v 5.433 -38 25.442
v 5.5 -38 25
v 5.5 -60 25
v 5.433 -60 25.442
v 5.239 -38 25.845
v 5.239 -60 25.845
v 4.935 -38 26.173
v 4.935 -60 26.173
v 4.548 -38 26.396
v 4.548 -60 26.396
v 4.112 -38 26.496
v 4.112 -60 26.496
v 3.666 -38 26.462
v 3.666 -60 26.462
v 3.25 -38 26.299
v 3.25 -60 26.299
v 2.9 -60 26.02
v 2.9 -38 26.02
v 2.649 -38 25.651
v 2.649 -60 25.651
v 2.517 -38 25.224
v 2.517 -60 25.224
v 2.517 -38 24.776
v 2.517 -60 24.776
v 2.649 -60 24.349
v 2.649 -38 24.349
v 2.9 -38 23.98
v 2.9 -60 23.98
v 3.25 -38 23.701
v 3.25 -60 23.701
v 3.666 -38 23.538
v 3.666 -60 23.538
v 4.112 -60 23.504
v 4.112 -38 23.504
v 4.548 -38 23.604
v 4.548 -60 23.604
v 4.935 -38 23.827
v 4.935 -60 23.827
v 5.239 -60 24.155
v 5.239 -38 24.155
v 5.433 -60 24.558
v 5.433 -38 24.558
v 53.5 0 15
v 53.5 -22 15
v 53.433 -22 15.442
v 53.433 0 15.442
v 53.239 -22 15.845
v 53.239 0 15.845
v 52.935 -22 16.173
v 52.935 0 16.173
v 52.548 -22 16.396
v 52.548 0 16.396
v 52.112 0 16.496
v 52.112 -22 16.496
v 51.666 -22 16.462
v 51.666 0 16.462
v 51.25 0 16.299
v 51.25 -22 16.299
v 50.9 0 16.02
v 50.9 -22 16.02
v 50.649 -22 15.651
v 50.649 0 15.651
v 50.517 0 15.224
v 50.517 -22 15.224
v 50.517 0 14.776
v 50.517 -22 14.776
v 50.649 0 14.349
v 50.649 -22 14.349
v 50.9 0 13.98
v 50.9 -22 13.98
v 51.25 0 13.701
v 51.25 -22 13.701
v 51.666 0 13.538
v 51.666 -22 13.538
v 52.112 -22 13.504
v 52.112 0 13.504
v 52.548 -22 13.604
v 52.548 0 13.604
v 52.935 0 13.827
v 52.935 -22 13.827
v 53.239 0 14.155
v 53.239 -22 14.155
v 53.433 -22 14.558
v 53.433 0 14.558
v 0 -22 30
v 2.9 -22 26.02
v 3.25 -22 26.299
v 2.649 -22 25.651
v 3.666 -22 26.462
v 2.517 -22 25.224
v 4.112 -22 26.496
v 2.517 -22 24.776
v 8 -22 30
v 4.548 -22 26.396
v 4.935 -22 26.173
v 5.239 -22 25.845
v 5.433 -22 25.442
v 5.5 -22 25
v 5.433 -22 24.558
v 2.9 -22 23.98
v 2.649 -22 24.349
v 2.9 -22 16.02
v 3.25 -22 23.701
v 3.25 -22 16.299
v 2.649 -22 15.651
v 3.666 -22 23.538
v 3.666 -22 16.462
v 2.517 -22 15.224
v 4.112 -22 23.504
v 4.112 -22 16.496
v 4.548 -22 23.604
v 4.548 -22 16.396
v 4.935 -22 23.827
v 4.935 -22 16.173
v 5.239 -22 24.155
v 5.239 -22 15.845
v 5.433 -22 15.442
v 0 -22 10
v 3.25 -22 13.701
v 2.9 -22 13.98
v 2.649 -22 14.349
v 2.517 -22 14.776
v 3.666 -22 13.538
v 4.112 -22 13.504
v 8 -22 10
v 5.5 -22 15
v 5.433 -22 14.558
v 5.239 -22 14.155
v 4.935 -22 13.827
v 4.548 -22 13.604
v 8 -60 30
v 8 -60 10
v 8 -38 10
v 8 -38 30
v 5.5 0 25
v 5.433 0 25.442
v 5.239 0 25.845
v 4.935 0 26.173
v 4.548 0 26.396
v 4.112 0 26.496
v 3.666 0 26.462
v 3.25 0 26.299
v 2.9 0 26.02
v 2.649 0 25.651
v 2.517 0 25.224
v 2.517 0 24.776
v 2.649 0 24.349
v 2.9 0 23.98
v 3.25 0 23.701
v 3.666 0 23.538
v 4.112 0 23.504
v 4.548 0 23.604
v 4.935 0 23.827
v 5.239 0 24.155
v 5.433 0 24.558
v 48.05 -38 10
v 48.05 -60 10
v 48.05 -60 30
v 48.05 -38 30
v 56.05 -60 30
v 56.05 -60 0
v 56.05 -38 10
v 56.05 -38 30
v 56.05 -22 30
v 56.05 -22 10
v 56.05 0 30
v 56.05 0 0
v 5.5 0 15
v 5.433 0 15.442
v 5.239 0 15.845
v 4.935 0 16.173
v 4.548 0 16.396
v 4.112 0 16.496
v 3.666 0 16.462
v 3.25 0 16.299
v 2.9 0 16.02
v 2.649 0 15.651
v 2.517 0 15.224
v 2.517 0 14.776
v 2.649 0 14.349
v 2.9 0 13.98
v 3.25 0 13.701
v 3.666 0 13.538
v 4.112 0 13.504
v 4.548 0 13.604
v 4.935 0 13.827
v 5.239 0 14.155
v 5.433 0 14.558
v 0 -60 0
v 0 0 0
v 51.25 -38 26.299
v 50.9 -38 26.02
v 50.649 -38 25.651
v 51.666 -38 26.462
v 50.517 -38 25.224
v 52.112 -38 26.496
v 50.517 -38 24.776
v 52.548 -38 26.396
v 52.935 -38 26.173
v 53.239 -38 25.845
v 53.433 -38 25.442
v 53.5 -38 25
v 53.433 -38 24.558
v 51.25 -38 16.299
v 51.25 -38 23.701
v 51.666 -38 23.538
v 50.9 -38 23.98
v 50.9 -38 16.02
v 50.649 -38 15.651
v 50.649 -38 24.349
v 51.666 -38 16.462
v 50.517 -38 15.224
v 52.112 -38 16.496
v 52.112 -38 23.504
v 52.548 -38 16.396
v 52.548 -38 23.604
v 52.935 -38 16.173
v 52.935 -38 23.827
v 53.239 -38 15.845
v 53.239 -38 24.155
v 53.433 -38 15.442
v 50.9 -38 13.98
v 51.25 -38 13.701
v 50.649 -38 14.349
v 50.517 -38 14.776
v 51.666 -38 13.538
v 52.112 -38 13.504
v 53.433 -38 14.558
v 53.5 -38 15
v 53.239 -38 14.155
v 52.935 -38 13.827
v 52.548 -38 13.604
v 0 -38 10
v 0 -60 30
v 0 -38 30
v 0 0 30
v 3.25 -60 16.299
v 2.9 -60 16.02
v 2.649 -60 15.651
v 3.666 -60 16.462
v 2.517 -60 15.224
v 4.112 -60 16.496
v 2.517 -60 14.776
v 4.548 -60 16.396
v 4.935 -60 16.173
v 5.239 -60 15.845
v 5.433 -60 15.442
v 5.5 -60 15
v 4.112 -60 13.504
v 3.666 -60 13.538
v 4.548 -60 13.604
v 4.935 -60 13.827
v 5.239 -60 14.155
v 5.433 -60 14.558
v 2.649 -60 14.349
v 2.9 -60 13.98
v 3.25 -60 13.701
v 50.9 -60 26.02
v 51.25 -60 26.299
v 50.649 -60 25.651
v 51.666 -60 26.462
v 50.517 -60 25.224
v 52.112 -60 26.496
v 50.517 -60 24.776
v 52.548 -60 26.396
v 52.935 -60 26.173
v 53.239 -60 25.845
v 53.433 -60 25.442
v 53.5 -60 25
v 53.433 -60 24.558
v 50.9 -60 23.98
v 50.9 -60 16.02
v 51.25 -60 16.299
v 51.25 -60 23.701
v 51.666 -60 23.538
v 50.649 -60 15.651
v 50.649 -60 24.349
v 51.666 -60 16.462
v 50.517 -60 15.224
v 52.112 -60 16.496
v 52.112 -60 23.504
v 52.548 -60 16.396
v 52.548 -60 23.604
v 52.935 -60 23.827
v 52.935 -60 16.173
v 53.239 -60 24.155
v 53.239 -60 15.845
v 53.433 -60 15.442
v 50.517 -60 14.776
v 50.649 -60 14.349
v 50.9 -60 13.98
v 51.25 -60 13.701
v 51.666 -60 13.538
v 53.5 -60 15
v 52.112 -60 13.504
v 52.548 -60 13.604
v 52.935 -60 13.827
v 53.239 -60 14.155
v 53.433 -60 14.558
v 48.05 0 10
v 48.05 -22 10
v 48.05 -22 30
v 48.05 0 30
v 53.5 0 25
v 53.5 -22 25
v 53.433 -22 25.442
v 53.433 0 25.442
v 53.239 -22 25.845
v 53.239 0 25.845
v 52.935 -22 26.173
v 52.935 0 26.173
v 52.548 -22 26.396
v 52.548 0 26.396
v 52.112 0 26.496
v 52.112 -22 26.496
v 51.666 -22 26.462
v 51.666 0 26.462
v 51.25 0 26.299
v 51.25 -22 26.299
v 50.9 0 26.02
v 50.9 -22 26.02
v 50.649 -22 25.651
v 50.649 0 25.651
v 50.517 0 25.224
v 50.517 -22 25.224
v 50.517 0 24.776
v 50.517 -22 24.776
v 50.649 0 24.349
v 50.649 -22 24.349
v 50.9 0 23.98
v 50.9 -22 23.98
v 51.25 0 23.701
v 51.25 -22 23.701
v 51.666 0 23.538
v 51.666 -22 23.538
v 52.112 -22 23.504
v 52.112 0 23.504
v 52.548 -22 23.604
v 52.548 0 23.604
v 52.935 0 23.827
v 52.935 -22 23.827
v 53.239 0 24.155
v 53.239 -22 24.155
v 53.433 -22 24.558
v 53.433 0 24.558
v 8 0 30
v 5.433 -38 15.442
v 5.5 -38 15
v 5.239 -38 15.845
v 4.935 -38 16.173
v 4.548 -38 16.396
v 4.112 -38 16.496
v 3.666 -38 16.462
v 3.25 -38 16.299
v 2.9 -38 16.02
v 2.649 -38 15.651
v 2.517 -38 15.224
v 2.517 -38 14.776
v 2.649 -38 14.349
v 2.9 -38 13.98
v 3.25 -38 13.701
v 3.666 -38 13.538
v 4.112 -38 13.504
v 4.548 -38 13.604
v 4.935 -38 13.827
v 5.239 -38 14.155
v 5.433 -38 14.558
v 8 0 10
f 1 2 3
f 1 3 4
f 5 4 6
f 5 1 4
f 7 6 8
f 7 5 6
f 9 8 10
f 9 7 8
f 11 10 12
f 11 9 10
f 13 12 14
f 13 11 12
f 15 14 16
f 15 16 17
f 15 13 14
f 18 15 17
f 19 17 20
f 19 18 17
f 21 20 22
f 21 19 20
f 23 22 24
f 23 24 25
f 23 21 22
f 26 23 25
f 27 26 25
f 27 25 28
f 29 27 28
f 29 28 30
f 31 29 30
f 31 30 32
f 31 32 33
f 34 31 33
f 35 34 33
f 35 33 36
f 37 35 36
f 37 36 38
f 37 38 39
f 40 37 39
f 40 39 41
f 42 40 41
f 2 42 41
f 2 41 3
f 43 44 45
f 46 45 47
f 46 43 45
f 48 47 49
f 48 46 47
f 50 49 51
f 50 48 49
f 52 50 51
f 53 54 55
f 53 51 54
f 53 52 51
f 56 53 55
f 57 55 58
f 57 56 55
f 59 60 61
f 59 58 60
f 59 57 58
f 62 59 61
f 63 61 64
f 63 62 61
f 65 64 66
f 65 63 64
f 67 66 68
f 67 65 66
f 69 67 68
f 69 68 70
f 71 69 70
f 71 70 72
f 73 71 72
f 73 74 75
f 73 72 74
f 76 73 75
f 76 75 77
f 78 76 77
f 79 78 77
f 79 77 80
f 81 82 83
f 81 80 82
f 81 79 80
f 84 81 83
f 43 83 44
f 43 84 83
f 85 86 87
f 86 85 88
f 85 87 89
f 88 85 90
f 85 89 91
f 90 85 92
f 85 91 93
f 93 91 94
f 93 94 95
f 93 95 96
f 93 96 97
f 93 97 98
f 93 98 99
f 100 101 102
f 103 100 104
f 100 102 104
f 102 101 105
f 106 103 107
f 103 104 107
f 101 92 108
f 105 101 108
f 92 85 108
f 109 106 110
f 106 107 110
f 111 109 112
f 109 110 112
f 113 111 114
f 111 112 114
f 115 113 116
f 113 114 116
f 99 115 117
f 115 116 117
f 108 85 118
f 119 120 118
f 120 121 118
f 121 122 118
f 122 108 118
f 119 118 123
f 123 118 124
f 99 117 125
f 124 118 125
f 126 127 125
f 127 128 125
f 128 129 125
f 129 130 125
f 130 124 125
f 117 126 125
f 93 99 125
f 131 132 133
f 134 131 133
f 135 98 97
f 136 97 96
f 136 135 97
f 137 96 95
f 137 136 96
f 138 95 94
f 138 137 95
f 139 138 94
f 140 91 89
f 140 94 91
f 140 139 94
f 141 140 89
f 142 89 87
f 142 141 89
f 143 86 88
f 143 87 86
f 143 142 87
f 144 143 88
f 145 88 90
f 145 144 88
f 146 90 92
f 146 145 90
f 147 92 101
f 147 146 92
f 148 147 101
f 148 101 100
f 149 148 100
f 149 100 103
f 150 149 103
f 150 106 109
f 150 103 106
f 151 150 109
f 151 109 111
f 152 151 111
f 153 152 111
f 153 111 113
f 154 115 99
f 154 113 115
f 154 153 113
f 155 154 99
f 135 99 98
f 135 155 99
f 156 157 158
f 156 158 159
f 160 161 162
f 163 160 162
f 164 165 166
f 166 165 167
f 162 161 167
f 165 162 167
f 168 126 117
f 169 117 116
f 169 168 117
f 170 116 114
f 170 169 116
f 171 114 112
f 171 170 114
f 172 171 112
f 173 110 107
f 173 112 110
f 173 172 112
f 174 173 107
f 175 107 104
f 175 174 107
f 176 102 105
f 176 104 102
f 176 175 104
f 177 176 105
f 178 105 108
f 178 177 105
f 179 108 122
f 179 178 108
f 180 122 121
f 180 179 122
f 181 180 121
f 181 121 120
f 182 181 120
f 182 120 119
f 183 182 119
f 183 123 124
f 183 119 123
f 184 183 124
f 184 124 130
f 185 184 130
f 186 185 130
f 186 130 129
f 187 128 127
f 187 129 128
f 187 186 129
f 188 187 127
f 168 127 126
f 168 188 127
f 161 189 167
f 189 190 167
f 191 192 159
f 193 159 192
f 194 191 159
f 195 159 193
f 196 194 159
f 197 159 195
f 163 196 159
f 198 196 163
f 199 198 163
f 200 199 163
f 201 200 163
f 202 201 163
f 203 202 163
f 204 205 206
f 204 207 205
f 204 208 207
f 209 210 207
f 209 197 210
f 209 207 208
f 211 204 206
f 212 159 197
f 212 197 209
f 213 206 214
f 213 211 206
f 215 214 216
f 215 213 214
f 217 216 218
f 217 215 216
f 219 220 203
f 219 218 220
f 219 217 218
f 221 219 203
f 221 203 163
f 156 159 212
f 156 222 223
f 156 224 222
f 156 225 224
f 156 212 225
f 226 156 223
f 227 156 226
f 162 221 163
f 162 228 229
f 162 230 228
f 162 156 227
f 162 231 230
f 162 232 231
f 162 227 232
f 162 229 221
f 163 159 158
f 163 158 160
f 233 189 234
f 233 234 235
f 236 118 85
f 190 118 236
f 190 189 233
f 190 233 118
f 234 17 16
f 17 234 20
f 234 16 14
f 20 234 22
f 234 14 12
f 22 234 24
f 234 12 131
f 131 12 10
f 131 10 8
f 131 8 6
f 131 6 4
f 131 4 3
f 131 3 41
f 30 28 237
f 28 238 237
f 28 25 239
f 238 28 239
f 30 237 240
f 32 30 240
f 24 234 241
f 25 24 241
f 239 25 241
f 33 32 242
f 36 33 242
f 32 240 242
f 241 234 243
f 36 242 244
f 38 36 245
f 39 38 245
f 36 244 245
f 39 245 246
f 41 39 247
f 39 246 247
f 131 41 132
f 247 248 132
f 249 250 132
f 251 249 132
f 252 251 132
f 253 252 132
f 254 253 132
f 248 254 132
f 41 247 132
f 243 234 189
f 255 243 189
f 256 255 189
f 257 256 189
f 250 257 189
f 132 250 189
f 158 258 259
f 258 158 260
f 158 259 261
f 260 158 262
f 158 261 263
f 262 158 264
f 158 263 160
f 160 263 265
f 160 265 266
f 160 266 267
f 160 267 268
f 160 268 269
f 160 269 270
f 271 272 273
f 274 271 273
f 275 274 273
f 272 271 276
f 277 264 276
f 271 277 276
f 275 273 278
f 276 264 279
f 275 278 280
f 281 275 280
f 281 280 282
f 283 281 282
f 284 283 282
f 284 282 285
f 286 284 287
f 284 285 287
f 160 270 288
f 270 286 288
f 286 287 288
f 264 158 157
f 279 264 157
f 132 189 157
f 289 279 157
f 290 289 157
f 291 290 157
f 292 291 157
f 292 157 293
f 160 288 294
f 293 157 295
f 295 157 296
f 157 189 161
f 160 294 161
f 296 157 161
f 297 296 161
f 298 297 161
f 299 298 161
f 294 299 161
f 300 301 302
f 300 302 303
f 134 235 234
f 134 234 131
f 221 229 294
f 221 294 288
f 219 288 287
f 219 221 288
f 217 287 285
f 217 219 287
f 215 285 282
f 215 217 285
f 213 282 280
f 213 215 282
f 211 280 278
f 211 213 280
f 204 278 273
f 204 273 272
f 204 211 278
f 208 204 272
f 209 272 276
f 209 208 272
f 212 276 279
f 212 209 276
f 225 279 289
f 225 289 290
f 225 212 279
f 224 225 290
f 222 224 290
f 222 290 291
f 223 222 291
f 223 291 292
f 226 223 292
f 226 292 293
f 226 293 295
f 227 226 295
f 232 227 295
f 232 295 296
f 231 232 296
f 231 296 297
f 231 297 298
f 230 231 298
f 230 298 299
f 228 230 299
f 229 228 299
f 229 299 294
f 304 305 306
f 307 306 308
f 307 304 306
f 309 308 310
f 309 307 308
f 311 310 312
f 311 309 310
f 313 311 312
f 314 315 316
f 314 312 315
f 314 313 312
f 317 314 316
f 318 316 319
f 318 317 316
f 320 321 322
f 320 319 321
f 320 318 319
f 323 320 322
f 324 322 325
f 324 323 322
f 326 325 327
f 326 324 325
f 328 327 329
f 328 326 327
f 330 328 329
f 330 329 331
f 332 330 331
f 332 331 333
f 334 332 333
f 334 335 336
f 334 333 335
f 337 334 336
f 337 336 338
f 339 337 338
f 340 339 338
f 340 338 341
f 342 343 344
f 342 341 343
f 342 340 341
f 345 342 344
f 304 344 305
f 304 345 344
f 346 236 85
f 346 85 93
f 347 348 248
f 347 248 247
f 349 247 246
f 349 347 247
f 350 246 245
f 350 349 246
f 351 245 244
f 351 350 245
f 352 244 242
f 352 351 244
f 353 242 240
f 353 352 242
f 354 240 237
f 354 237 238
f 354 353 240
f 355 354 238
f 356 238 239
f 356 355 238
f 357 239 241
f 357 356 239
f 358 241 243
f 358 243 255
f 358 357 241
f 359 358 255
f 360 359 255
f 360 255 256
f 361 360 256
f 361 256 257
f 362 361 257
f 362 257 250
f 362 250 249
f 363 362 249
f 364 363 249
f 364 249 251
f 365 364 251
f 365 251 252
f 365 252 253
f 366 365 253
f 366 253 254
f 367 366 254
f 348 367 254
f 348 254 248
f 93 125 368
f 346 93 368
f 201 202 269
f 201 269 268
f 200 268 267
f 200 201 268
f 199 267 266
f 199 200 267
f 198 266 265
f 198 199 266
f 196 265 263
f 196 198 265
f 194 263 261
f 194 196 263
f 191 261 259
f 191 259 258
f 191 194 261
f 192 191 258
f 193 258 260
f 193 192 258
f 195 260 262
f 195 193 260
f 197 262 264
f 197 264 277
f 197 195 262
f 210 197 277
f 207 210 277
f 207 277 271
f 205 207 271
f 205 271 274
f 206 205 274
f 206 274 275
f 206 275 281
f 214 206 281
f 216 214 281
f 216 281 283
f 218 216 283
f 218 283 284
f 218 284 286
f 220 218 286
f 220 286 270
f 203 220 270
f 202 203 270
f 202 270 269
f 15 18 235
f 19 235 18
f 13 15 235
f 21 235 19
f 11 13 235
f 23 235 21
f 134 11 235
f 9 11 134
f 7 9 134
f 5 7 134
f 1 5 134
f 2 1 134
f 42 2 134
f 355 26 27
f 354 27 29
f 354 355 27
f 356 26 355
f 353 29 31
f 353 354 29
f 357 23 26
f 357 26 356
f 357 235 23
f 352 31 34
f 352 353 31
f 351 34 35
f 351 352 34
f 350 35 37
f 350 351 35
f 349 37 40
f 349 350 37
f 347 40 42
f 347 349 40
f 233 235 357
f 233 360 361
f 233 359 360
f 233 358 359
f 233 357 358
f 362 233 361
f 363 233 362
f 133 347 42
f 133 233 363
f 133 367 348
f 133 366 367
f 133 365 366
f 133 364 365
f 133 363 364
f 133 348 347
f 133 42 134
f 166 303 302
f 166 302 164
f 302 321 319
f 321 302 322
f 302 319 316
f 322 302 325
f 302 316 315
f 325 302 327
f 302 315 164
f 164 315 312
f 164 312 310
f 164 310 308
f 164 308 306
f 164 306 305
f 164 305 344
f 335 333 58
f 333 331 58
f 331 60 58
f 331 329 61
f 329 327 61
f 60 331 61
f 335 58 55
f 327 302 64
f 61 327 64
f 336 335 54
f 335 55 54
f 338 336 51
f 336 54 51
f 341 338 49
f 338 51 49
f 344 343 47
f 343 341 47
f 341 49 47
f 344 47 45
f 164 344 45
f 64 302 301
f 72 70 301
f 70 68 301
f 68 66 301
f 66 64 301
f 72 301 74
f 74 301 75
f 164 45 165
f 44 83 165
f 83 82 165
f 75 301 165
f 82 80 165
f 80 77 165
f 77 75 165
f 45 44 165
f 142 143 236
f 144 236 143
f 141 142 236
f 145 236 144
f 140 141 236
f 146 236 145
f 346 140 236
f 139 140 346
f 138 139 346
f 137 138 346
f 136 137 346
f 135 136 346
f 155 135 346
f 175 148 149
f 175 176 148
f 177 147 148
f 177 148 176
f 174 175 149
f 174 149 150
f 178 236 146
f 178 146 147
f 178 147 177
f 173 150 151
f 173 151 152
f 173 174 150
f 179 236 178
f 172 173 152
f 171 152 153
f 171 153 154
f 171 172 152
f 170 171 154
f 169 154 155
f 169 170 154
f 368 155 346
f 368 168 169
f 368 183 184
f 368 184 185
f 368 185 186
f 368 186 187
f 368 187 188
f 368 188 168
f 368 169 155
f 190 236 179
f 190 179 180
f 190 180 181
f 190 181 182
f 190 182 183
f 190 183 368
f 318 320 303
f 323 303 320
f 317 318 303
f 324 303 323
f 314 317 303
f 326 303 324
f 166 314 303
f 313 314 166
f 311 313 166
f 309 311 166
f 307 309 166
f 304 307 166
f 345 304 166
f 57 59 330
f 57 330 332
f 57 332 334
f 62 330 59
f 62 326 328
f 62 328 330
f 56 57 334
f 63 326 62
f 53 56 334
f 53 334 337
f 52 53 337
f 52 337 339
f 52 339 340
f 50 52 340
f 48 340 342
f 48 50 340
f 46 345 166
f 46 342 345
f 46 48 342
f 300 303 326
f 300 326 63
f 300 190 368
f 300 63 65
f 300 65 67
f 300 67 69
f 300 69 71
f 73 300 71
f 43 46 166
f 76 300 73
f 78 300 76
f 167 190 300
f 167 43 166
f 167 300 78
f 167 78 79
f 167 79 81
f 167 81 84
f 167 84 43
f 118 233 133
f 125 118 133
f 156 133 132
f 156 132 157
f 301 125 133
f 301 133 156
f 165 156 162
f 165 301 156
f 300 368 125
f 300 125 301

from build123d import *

# Parameters (mm, degrees)
CYLINDER003_R     = 1.5
CYLINDER003_DEPTH = 60
CYLINDER002_R     = 1.5
CYLINDER002_DEPTH = 60
CYLINDER001_R     = 1.5
CYLINDER001_DEPTH = 60
CYLINDER_R        = 1.5
CYLINDER_DEPTH    = 60
SKETCH_W          = 56.05
SKETCH_H          = 60
PAD_DEPTH         = 10
SKETCH003_W       = 8
SKETCH003_H       = 22
PAD002_DEPTH      = 30
SKETCH004_W       = 8
SKETCH004_H       = 22
PAD003_DEPTH      = 30
SKETCH005_W       = 8
SKETCH005_H       = 22
PAD004_DEPTH      = 30
SKETCH006_W       = 8
SKETCH006_H       = 22
PAD005_DEPTH      = 30


with BuildPart() as cylinder003:
    # Cylinder003 → Cylinder003 (new body)
    with BuildSketch(Plane(origin=(52, 0, 15), x_dir=(1, 0, 0), z_dir=(0, -1, 0))):
        Circle(CYLINDER003_R)
    extrude(amount=CYLINDER003_DEPTH)


with BuildPart() as cylinder002:
    # Cylinder002 → Cylinder002 (new body)
    with BuildSketch(Plane(origin=(52, 0, 25), x_dir=(1, 0, 0), z_dir=(0, -1, 0))):
        Circle(CYLINDER002_R)
    extrude(amount=CYLINDER002_DEPTH)


with BuildPart() as cylinder001:
    # Cylinder001 → Cylinder001 (new body)
    with BuildSketch(Plane(origin=(4, 0, 15), x_dir=(1, 0, 0), z_dir=(0, -1, 0))):
        Circle(CYLINDER001_R)
    extrude(amount=CYLINDER001_DEPTH)


with BuildPart() as cylinder:
    # Cylinder → Cylinder (new body)
    with BuildSketch(Plane(origin=(4, 0, 25), x_dir=(1, 0, 0), z_dir=(0, -1, 0))):
        Circle(CYLINDER_R)
    extrude(amount=CYLINDER_DEPTH)


with BuildPart() as cut003:
    # Sketch → Pad (new body)
    with BuildSketch(Plane.XY):
        with Locations((28.025, -30)):
            Rectangle(SKETCH_W, SKETCH_H)
    extrude(amount=PAD_DEPTH)

    # Sketch003 → Pad002 (join)
    with BuildSketch(Plane.XY):
        with Locations((4, -11)):
            Rectangle(SKETCH003_W, SKETCH003_H)
    extrude(amount=PAD002_DEPTH)

    # Sketch004 → Pad003 (join)
    with BuildSketch(Plane.XY):
        with Locations((52.05, -11)):
            Rectangle(SKETCH004_W, SKETCH004_H)
    extrude(amount=PAD003_DEPTH)

    # Sketch005 → Pad004 (join)
    with BuildSketch(Plane.XY):
        with Locations((4, -49)):
            Rectangle(SKETCH005_W, SKETCH005_H)
    extrude(amount=PAD004_DEPTH)

    # Sketch006 → Pad005 (join)
    with BuildSketch(Plane.XY):
        with Locations((52.05, -49)):
            Rectangle(SKETCH006_W, SKETCH006_H)
    extrude(amount=PAD005_DEPTH)

    # Cut: cut Cylinder
    add(cylinder.part, mode=Mode.SUBTRACT)

    # Cut001: cut Cylinder001
    add(cylinder001.part, mode=Mode.SUBTRACT)

    # Cut002: cut Cylinder002
    add(cylinder002.part, mode=Mode.SUBTRACT)

    # Cut003: cut Cylinder003
    add(cylinder003.part, mode=Mode.SUBTRACT)


solid = cut003.part
